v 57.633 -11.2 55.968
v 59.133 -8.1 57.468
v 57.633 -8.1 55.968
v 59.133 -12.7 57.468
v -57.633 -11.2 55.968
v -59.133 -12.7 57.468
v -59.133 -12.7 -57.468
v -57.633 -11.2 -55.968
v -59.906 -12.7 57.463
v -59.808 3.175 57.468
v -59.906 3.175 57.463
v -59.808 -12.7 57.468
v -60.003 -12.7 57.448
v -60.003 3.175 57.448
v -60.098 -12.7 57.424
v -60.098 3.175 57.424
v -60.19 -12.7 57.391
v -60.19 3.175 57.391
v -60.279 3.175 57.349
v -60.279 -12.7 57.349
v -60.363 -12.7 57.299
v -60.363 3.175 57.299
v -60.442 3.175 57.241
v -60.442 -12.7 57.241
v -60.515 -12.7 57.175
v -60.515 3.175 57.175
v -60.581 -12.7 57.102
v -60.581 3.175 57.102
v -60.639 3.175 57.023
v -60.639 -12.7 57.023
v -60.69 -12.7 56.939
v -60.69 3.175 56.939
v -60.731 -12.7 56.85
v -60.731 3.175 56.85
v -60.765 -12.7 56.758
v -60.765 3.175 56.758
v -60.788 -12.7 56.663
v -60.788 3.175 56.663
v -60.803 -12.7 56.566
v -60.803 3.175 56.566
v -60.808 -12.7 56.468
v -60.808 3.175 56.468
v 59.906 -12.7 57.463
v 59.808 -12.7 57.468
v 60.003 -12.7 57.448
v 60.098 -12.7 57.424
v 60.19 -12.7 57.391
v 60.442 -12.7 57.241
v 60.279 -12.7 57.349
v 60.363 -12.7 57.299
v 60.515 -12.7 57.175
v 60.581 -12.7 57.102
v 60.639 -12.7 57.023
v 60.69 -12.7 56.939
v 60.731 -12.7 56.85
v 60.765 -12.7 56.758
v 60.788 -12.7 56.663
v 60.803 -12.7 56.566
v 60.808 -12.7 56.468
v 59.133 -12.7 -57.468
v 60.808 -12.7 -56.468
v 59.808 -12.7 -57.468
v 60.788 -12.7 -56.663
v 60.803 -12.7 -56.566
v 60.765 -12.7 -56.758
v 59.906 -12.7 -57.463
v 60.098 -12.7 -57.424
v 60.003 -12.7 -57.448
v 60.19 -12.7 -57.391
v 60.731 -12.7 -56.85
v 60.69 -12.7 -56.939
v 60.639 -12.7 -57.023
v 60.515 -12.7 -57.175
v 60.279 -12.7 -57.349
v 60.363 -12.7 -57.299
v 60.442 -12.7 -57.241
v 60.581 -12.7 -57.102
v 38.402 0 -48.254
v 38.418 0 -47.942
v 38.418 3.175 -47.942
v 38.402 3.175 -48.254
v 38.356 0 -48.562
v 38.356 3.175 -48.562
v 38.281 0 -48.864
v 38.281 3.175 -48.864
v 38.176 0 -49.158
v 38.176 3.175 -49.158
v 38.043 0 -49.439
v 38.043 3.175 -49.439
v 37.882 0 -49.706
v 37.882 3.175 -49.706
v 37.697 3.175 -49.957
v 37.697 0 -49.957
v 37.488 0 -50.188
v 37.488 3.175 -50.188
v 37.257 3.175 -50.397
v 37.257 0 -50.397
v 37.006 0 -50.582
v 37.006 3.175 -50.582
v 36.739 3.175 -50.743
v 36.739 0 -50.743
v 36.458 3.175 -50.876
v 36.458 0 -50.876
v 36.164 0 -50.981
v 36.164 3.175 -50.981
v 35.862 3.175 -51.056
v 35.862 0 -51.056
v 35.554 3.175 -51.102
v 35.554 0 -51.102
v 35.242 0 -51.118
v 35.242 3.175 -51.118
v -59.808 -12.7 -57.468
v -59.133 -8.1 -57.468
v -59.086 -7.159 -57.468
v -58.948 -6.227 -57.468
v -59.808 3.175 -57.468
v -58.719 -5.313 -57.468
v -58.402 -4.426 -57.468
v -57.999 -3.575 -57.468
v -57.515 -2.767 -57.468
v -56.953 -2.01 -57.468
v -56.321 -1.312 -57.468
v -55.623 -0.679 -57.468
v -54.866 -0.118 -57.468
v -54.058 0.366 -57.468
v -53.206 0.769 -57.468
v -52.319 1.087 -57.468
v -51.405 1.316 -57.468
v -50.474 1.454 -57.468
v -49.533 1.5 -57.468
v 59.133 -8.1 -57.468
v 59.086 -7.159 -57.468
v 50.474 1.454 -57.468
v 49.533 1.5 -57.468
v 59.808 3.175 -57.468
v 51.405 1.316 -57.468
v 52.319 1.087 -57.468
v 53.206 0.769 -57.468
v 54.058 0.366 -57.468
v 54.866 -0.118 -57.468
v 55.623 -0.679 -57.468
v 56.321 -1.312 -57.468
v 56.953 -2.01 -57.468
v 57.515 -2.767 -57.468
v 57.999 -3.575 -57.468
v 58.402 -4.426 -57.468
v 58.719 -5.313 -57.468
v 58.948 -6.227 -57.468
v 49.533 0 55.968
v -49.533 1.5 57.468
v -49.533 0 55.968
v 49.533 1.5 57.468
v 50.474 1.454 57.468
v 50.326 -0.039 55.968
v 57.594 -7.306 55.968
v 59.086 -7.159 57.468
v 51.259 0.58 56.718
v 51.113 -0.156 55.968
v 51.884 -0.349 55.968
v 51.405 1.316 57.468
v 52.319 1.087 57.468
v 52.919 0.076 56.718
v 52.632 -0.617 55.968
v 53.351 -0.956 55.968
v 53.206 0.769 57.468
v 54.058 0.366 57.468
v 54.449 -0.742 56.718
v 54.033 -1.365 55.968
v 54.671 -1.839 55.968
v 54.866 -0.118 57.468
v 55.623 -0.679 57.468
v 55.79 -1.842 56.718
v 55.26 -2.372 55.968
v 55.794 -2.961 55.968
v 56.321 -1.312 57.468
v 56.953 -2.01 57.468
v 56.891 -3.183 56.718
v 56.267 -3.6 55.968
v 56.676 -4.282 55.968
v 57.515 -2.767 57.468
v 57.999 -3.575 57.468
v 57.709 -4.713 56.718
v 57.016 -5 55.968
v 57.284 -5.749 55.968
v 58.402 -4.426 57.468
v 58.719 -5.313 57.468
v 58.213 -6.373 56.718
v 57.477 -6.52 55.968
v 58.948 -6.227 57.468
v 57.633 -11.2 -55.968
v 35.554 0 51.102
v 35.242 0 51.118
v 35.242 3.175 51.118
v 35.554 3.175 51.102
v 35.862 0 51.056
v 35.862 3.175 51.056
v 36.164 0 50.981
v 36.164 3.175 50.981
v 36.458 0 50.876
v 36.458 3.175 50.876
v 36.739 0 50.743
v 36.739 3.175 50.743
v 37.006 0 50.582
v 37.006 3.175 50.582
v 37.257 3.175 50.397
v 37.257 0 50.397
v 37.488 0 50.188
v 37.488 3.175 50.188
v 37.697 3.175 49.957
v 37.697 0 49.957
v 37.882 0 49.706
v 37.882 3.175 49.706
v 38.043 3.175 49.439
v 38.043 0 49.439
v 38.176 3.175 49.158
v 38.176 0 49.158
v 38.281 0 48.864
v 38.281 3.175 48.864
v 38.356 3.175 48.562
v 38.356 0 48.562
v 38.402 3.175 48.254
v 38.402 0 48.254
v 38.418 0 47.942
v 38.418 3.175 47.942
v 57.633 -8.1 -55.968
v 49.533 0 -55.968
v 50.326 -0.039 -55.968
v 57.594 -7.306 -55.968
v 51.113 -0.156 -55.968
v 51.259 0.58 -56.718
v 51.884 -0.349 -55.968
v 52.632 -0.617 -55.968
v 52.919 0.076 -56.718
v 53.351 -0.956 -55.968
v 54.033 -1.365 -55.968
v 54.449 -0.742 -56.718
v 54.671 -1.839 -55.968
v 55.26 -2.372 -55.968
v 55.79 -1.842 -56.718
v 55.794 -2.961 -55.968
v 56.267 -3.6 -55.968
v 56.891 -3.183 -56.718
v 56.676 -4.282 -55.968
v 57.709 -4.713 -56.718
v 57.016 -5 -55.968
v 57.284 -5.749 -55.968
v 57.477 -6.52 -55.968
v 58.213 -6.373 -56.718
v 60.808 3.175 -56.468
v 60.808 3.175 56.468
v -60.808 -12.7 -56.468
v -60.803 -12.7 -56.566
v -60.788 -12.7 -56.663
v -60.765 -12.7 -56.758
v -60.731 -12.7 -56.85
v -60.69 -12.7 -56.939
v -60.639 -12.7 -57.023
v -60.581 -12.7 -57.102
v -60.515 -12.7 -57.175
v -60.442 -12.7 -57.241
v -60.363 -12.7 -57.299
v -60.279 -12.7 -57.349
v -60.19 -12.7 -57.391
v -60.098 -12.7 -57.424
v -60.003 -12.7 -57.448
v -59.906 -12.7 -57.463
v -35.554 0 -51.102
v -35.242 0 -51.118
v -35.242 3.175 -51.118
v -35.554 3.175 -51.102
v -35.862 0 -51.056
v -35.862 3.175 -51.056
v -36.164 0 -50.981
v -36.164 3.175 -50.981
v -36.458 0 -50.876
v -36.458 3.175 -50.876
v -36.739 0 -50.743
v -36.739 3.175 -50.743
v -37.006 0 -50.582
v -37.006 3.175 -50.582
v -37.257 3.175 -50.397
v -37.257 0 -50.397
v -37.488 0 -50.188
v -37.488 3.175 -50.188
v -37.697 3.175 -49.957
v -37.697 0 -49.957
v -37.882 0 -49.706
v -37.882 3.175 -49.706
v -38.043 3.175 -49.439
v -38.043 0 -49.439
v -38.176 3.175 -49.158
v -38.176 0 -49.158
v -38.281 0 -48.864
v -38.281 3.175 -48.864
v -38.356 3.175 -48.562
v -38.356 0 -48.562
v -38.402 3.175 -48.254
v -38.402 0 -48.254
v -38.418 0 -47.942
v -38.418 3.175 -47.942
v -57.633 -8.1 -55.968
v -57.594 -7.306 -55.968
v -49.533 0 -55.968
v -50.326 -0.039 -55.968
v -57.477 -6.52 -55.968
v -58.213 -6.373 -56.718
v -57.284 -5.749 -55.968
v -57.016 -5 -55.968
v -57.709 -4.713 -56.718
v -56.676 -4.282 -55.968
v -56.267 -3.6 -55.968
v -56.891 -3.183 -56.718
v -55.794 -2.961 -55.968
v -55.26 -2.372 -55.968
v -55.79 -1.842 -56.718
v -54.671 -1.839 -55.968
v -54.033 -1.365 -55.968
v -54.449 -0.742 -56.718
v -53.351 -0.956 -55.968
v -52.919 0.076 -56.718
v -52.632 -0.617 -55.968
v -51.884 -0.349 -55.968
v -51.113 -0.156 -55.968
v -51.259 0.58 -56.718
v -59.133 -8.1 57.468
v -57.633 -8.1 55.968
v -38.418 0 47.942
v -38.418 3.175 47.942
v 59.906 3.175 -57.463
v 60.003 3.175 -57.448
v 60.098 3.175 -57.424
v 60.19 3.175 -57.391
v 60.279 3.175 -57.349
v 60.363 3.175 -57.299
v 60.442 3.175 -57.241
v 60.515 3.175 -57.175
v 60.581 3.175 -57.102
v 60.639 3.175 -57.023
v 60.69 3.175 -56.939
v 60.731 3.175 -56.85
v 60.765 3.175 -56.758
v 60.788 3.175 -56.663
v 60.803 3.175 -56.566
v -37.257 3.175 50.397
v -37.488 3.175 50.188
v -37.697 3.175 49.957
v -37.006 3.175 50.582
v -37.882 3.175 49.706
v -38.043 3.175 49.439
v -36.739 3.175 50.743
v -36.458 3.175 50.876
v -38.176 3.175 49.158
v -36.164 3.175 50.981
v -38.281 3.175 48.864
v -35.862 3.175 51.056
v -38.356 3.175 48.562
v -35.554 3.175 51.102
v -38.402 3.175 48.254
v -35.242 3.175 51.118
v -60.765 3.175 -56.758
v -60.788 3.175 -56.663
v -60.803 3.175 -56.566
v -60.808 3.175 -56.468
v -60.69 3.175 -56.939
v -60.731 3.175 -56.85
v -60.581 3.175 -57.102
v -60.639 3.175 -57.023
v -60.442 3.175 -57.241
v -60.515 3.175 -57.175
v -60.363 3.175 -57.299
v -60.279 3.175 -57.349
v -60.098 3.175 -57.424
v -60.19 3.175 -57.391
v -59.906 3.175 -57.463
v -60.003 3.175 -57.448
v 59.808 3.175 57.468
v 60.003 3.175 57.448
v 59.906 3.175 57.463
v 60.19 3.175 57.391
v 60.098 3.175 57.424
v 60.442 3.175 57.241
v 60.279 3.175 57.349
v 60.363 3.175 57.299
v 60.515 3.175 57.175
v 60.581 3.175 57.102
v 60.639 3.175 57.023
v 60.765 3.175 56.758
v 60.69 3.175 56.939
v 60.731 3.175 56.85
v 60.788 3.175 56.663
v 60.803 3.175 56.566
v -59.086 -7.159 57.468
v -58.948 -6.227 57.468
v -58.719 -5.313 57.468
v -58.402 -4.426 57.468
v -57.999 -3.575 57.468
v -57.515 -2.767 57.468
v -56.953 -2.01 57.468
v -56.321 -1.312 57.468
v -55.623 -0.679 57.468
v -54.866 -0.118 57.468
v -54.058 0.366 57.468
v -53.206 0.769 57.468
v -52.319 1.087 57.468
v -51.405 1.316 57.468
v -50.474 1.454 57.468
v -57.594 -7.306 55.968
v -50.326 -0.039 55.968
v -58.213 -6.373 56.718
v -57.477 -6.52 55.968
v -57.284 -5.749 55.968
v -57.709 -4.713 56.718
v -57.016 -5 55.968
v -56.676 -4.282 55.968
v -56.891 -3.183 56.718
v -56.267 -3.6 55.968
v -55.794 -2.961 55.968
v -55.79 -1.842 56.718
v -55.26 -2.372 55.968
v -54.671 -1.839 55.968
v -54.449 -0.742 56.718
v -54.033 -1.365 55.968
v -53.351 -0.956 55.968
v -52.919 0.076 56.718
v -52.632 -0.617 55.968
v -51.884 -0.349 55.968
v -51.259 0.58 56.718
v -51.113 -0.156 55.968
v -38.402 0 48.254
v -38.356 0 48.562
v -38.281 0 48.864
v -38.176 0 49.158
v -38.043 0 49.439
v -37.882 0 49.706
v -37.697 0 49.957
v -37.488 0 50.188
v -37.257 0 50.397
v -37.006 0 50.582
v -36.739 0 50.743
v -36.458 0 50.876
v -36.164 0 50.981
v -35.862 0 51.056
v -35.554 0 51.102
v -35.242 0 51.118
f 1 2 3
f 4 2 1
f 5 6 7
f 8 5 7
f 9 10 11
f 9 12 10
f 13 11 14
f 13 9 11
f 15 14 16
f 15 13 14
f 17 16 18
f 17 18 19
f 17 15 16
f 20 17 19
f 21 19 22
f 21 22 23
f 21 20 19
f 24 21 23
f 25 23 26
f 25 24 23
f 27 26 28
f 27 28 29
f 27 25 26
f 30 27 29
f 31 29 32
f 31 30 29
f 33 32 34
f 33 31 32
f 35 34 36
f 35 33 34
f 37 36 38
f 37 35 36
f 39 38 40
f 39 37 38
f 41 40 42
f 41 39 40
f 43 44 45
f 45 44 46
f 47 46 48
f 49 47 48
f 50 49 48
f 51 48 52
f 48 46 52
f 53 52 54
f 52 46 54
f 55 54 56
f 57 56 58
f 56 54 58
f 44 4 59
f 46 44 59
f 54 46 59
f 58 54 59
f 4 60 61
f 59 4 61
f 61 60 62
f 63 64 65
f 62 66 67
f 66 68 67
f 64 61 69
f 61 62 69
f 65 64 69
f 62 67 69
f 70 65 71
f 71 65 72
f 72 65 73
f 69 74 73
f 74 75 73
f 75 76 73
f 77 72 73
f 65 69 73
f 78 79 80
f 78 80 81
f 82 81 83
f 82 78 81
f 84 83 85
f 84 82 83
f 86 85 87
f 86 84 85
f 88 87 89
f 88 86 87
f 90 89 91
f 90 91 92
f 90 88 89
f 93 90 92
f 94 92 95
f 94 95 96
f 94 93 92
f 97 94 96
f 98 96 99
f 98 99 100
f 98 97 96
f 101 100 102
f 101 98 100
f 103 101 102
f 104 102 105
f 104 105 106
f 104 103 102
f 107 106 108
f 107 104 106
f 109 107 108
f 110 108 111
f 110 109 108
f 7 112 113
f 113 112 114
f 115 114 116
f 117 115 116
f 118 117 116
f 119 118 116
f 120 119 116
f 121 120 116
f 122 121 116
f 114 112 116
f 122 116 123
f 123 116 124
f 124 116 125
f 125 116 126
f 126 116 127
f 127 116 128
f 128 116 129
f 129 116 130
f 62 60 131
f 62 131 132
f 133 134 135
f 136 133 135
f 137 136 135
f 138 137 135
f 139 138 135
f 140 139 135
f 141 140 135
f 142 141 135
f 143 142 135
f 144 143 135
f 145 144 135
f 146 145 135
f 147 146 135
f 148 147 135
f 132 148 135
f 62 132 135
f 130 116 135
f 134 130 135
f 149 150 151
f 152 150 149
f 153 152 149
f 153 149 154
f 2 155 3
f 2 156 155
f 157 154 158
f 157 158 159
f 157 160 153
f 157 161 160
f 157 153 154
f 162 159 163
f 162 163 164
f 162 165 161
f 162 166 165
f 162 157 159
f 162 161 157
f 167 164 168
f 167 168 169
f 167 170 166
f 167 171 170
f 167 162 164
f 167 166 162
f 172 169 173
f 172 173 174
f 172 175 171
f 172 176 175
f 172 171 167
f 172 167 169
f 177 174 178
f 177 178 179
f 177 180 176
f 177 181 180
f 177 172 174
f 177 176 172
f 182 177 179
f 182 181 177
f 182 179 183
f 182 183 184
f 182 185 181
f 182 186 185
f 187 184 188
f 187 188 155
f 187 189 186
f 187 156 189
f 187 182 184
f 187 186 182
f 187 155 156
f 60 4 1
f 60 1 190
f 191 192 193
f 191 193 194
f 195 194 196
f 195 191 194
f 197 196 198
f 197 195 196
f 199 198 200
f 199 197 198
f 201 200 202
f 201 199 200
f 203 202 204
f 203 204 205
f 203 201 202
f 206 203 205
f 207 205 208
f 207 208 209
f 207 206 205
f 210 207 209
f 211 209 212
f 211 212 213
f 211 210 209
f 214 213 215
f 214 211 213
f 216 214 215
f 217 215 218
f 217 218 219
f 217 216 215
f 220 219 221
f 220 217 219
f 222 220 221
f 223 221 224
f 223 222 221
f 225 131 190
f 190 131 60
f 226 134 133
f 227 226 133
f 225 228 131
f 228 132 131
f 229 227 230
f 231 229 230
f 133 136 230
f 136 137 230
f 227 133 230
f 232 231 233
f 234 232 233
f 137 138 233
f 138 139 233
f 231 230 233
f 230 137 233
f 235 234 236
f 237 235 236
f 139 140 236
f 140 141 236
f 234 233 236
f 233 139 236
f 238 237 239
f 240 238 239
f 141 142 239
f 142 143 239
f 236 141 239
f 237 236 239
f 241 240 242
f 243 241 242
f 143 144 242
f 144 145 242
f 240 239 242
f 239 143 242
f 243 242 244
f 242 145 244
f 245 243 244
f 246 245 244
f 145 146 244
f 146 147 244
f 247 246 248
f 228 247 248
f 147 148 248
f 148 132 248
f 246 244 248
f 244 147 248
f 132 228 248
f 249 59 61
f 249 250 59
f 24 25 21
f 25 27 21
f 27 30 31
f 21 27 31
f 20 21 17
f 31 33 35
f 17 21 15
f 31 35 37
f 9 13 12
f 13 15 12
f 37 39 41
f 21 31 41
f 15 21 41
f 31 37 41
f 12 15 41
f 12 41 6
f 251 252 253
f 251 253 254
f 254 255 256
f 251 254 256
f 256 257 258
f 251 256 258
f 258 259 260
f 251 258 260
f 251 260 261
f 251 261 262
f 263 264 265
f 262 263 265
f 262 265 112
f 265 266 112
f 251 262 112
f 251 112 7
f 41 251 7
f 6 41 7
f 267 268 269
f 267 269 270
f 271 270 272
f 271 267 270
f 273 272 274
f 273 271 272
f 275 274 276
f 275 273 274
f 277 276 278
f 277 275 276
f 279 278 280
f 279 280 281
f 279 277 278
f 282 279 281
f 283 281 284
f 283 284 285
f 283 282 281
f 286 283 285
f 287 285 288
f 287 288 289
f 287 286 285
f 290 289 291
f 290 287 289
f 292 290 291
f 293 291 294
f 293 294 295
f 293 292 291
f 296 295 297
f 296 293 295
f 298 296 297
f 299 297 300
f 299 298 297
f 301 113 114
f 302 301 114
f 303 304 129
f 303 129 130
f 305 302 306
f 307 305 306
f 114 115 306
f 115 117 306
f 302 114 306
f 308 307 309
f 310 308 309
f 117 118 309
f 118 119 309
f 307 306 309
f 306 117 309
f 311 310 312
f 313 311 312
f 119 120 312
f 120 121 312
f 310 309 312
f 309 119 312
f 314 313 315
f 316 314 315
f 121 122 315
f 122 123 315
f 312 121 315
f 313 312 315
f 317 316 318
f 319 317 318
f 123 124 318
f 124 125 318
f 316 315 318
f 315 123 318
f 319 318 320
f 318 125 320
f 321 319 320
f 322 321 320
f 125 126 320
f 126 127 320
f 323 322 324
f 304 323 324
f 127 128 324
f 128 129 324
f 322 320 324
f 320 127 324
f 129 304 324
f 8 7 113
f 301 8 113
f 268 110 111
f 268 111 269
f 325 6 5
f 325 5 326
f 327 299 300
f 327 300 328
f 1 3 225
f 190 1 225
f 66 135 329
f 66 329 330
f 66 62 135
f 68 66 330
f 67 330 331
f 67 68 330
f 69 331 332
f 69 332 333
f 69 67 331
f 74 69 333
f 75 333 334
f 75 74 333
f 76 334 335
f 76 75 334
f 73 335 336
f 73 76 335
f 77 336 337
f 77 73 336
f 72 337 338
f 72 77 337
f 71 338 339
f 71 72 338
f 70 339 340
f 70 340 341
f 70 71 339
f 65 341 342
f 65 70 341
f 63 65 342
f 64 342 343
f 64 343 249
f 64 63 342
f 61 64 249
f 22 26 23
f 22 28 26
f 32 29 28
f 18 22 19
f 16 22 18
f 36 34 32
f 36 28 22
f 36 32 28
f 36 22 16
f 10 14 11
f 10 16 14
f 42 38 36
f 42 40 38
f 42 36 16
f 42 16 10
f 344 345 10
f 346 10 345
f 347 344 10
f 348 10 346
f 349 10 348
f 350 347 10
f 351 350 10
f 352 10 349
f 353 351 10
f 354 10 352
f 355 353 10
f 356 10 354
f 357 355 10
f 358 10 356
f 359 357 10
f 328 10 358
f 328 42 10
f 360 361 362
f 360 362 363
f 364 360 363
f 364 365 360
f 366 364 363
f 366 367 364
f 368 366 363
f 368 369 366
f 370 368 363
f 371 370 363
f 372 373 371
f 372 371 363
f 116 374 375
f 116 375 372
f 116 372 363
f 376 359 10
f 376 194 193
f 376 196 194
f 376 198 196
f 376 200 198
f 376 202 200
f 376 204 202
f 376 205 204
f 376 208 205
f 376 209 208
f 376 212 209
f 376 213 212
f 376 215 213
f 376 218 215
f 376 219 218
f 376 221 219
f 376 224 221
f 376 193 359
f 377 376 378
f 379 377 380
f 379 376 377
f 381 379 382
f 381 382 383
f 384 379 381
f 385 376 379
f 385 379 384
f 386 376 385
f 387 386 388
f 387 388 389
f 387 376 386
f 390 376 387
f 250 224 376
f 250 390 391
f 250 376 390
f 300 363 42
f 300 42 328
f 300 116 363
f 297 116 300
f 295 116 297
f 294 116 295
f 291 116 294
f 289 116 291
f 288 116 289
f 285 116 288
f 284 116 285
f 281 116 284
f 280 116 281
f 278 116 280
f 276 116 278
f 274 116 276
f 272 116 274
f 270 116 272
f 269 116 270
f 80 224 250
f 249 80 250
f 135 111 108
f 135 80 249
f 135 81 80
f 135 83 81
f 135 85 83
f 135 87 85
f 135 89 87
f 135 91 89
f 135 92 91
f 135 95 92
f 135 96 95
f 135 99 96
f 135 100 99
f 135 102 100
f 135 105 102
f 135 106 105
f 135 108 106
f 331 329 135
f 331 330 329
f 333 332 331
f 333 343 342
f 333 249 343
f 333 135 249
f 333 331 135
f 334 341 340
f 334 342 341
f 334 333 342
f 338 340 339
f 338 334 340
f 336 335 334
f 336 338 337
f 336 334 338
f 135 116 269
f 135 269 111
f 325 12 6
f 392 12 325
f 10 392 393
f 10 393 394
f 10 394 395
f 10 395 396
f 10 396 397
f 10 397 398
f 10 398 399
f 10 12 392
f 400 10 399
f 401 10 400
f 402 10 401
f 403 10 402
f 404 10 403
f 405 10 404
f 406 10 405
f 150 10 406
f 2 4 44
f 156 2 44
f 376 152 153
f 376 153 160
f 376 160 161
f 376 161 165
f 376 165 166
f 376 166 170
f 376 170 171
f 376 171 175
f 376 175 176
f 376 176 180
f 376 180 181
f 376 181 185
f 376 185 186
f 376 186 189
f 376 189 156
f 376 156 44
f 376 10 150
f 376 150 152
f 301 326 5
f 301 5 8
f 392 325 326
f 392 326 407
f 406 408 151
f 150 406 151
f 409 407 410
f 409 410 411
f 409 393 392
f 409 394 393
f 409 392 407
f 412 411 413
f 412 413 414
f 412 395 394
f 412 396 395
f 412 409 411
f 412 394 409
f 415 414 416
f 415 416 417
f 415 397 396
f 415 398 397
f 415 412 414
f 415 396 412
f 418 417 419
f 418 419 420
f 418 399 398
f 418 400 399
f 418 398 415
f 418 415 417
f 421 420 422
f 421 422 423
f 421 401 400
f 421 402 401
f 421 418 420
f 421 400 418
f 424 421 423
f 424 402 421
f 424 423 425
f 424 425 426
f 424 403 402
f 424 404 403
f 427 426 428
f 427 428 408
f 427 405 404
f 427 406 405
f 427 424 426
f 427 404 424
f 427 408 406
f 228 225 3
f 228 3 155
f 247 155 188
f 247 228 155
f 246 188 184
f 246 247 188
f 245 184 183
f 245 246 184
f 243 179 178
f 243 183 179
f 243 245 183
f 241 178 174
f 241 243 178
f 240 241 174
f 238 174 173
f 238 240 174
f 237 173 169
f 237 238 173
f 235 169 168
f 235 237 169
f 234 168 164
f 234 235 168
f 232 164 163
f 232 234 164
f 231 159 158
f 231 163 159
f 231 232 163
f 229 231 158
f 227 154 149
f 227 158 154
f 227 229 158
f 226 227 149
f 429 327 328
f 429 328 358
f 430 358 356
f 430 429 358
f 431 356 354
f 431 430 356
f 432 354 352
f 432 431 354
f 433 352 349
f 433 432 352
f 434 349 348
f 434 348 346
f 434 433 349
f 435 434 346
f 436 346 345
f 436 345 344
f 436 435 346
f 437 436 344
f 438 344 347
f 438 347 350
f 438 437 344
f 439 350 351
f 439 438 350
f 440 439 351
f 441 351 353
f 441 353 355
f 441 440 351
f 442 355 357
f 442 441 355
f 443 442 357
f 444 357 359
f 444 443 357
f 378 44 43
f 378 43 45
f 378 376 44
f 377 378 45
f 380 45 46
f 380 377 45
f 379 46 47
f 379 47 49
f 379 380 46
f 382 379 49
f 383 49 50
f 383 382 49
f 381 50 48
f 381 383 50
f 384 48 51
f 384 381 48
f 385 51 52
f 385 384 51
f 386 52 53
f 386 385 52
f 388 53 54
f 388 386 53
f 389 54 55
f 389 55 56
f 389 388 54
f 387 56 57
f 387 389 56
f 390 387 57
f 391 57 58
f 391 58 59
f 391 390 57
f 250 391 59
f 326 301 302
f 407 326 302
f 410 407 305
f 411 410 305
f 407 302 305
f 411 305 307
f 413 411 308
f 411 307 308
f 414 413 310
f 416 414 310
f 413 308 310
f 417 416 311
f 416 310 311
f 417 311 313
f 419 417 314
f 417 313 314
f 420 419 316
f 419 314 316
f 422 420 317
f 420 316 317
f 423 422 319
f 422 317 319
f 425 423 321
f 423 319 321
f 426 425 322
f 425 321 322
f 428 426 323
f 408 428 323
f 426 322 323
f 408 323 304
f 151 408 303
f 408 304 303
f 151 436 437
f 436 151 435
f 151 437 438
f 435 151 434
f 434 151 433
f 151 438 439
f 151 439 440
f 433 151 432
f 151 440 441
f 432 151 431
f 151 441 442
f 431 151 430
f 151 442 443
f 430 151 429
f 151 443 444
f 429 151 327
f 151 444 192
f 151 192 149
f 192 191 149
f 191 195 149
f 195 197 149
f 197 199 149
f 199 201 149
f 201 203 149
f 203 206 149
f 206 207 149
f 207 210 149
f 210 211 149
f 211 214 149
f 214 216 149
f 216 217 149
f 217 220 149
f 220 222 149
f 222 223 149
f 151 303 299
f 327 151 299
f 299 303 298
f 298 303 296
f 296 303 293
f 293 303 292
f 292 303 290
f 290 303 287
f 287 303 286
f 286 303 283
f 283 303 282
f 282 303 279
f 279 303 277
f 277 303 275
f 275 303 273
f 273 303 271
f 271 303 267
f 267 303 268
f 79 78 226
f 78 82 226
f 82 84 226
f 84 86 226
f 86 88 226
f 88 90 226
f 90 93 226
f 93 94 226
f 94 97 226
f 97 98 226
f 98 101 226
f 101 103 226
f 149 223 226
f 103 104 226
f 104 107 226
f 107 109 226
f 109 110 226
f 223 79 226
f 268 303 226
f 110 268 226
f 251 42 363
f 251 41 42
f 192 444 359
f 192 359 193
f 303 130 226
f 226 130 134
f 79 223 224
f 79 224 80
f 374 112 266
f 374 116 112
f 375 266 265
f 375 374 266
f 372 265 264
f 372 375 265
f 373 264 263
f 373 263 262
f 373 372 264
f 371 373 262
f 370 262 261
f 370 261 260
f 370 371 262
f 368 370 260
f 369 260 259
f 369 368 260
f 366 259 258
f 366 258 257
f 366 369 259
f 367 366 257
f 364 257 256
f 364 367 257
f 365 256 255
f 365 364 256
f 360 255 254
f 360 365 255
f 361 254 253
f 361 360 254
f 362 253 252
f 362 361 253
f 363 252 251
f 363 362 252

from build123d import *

# Parameters (mm, degrees)
SKETCH1_W           = 121.6152
SKETCH1_H           = 114.935
BOSS_EXTRUDE1_DEPTH = 3.175
SKETCH1_3_W         = 3.175
SKETCH1_3_H         = 114.935
BOSS_EXTRUDE2_DEPTH = 12.7
FILLET1_R           = 8.10006
CHAMFER1_SIZE       = 1.5
FILLET2_R           = 1


with BuildPart() as part:
    # Sketch1 → Boss-Extrude1 (new body)
    with BuildSketch(Plane(origin=(0, 0, 0), x_dir=(1, 0, 0), z_dir=(0, 1, 0))):
        Rectangle(SKETCH1_W, SKETCH1_H)
        with BuildLine():
            ThreePointArc((-38.4175, 47.9425), (-37.48756403, 50.18756403), (-35.2425, 51.1175))
            Line((-35.2425, 51.1175), (35.2425, 51.1175))
            ThreePointArc((35.2425, 51.1175), (37.48756403, 50.18756403), (38.4175, 47.9425))
            Line((38.4175, 47.9425), (38.4175, -47.9425))
            ThreePointArc((38.4175, -47.9425), (37.48756403, -50.18756403), (35.2425, -51.1175))
            Line((35.2425, -51.1175), (-35.2425, -51.1175))
            ThreePointArc((-35.2425, -51.1175), (-37.48756403, -50.18756403), (-38.4175, -47.9425))
            Line((-38.4175, -47.9425), (-38.4175, 47.9425))
        make_face(mode=Mode.SUBTRACT)
    extrude(amount=BOSS_EXTRUDE1_DEPTH)

    # Sketch1<3> → Boss-Extrude2 (add)
    with BuildSketch(Plane(origin=(0, 0, 0), x_dir=(1, 0, 0), z_dir=(0, 1, 0))):
        with Locations((-59.2201, 0)):
            Rectangle(SKETCH1_3_W, SKETCH1_3_H)
        with Locations((59.2201, 0)):
            Rectangle(SKETCH1_3_W, SKETCH1_3_H)
    extrude(amount=-BOSS_EXTRUDE2_DEPTH)

    # Fillet1
    fillet1_edges = [part.edges().sort_by_distance(p)[0] for p in [
        (57.6326, 0, 0),
        (-57.6326, 0, 0),
    ]]
    fillet(fillet1_edges, radius=FILLET1_R)

    # Chamfer1
    chamfer1_edges = [part.edges().sort_by_distance(p)[0] for p in [
        (-57.6326, -10.40003, 57.4675),
        (-55.260147354, -2.372452646, 57.4675),
        (0, 0, 57.4675),
        (55.260147354, -2.372452646, 57.4675),
        (57.6326, -12.7, 0),
        (57.6326, -10.40003, 57.4675),
        (57.6326, -10.40003, -57.4675),
        (55.260147354, -2.372452646, -57.4675),
        (0, 0, -57.4675),
        (-55.260147354, -2.372452646, -57.4675),
        (-57.6326, -12.7, 0),
        (-57.6326, -10.40003, -57.4675),
    ]]
    chamfer(chamfer1_edges, length=CHAMFER1_SIZE)

    # Fillet2
    fillet2_edges = [part.edges().sort_by_distance(p)[0] for p in [
        (-60.8076, -4.7625, 57.4675),
        (-60.8076, -4.7625, -57.4675),
        (60.8076, -4.7625, -57.4675),
        (60.8076, -4.7625, 57.4675),
    ]]
    fillet(fillet2_edges, radius=FILLET2_R)


solid = part.part
